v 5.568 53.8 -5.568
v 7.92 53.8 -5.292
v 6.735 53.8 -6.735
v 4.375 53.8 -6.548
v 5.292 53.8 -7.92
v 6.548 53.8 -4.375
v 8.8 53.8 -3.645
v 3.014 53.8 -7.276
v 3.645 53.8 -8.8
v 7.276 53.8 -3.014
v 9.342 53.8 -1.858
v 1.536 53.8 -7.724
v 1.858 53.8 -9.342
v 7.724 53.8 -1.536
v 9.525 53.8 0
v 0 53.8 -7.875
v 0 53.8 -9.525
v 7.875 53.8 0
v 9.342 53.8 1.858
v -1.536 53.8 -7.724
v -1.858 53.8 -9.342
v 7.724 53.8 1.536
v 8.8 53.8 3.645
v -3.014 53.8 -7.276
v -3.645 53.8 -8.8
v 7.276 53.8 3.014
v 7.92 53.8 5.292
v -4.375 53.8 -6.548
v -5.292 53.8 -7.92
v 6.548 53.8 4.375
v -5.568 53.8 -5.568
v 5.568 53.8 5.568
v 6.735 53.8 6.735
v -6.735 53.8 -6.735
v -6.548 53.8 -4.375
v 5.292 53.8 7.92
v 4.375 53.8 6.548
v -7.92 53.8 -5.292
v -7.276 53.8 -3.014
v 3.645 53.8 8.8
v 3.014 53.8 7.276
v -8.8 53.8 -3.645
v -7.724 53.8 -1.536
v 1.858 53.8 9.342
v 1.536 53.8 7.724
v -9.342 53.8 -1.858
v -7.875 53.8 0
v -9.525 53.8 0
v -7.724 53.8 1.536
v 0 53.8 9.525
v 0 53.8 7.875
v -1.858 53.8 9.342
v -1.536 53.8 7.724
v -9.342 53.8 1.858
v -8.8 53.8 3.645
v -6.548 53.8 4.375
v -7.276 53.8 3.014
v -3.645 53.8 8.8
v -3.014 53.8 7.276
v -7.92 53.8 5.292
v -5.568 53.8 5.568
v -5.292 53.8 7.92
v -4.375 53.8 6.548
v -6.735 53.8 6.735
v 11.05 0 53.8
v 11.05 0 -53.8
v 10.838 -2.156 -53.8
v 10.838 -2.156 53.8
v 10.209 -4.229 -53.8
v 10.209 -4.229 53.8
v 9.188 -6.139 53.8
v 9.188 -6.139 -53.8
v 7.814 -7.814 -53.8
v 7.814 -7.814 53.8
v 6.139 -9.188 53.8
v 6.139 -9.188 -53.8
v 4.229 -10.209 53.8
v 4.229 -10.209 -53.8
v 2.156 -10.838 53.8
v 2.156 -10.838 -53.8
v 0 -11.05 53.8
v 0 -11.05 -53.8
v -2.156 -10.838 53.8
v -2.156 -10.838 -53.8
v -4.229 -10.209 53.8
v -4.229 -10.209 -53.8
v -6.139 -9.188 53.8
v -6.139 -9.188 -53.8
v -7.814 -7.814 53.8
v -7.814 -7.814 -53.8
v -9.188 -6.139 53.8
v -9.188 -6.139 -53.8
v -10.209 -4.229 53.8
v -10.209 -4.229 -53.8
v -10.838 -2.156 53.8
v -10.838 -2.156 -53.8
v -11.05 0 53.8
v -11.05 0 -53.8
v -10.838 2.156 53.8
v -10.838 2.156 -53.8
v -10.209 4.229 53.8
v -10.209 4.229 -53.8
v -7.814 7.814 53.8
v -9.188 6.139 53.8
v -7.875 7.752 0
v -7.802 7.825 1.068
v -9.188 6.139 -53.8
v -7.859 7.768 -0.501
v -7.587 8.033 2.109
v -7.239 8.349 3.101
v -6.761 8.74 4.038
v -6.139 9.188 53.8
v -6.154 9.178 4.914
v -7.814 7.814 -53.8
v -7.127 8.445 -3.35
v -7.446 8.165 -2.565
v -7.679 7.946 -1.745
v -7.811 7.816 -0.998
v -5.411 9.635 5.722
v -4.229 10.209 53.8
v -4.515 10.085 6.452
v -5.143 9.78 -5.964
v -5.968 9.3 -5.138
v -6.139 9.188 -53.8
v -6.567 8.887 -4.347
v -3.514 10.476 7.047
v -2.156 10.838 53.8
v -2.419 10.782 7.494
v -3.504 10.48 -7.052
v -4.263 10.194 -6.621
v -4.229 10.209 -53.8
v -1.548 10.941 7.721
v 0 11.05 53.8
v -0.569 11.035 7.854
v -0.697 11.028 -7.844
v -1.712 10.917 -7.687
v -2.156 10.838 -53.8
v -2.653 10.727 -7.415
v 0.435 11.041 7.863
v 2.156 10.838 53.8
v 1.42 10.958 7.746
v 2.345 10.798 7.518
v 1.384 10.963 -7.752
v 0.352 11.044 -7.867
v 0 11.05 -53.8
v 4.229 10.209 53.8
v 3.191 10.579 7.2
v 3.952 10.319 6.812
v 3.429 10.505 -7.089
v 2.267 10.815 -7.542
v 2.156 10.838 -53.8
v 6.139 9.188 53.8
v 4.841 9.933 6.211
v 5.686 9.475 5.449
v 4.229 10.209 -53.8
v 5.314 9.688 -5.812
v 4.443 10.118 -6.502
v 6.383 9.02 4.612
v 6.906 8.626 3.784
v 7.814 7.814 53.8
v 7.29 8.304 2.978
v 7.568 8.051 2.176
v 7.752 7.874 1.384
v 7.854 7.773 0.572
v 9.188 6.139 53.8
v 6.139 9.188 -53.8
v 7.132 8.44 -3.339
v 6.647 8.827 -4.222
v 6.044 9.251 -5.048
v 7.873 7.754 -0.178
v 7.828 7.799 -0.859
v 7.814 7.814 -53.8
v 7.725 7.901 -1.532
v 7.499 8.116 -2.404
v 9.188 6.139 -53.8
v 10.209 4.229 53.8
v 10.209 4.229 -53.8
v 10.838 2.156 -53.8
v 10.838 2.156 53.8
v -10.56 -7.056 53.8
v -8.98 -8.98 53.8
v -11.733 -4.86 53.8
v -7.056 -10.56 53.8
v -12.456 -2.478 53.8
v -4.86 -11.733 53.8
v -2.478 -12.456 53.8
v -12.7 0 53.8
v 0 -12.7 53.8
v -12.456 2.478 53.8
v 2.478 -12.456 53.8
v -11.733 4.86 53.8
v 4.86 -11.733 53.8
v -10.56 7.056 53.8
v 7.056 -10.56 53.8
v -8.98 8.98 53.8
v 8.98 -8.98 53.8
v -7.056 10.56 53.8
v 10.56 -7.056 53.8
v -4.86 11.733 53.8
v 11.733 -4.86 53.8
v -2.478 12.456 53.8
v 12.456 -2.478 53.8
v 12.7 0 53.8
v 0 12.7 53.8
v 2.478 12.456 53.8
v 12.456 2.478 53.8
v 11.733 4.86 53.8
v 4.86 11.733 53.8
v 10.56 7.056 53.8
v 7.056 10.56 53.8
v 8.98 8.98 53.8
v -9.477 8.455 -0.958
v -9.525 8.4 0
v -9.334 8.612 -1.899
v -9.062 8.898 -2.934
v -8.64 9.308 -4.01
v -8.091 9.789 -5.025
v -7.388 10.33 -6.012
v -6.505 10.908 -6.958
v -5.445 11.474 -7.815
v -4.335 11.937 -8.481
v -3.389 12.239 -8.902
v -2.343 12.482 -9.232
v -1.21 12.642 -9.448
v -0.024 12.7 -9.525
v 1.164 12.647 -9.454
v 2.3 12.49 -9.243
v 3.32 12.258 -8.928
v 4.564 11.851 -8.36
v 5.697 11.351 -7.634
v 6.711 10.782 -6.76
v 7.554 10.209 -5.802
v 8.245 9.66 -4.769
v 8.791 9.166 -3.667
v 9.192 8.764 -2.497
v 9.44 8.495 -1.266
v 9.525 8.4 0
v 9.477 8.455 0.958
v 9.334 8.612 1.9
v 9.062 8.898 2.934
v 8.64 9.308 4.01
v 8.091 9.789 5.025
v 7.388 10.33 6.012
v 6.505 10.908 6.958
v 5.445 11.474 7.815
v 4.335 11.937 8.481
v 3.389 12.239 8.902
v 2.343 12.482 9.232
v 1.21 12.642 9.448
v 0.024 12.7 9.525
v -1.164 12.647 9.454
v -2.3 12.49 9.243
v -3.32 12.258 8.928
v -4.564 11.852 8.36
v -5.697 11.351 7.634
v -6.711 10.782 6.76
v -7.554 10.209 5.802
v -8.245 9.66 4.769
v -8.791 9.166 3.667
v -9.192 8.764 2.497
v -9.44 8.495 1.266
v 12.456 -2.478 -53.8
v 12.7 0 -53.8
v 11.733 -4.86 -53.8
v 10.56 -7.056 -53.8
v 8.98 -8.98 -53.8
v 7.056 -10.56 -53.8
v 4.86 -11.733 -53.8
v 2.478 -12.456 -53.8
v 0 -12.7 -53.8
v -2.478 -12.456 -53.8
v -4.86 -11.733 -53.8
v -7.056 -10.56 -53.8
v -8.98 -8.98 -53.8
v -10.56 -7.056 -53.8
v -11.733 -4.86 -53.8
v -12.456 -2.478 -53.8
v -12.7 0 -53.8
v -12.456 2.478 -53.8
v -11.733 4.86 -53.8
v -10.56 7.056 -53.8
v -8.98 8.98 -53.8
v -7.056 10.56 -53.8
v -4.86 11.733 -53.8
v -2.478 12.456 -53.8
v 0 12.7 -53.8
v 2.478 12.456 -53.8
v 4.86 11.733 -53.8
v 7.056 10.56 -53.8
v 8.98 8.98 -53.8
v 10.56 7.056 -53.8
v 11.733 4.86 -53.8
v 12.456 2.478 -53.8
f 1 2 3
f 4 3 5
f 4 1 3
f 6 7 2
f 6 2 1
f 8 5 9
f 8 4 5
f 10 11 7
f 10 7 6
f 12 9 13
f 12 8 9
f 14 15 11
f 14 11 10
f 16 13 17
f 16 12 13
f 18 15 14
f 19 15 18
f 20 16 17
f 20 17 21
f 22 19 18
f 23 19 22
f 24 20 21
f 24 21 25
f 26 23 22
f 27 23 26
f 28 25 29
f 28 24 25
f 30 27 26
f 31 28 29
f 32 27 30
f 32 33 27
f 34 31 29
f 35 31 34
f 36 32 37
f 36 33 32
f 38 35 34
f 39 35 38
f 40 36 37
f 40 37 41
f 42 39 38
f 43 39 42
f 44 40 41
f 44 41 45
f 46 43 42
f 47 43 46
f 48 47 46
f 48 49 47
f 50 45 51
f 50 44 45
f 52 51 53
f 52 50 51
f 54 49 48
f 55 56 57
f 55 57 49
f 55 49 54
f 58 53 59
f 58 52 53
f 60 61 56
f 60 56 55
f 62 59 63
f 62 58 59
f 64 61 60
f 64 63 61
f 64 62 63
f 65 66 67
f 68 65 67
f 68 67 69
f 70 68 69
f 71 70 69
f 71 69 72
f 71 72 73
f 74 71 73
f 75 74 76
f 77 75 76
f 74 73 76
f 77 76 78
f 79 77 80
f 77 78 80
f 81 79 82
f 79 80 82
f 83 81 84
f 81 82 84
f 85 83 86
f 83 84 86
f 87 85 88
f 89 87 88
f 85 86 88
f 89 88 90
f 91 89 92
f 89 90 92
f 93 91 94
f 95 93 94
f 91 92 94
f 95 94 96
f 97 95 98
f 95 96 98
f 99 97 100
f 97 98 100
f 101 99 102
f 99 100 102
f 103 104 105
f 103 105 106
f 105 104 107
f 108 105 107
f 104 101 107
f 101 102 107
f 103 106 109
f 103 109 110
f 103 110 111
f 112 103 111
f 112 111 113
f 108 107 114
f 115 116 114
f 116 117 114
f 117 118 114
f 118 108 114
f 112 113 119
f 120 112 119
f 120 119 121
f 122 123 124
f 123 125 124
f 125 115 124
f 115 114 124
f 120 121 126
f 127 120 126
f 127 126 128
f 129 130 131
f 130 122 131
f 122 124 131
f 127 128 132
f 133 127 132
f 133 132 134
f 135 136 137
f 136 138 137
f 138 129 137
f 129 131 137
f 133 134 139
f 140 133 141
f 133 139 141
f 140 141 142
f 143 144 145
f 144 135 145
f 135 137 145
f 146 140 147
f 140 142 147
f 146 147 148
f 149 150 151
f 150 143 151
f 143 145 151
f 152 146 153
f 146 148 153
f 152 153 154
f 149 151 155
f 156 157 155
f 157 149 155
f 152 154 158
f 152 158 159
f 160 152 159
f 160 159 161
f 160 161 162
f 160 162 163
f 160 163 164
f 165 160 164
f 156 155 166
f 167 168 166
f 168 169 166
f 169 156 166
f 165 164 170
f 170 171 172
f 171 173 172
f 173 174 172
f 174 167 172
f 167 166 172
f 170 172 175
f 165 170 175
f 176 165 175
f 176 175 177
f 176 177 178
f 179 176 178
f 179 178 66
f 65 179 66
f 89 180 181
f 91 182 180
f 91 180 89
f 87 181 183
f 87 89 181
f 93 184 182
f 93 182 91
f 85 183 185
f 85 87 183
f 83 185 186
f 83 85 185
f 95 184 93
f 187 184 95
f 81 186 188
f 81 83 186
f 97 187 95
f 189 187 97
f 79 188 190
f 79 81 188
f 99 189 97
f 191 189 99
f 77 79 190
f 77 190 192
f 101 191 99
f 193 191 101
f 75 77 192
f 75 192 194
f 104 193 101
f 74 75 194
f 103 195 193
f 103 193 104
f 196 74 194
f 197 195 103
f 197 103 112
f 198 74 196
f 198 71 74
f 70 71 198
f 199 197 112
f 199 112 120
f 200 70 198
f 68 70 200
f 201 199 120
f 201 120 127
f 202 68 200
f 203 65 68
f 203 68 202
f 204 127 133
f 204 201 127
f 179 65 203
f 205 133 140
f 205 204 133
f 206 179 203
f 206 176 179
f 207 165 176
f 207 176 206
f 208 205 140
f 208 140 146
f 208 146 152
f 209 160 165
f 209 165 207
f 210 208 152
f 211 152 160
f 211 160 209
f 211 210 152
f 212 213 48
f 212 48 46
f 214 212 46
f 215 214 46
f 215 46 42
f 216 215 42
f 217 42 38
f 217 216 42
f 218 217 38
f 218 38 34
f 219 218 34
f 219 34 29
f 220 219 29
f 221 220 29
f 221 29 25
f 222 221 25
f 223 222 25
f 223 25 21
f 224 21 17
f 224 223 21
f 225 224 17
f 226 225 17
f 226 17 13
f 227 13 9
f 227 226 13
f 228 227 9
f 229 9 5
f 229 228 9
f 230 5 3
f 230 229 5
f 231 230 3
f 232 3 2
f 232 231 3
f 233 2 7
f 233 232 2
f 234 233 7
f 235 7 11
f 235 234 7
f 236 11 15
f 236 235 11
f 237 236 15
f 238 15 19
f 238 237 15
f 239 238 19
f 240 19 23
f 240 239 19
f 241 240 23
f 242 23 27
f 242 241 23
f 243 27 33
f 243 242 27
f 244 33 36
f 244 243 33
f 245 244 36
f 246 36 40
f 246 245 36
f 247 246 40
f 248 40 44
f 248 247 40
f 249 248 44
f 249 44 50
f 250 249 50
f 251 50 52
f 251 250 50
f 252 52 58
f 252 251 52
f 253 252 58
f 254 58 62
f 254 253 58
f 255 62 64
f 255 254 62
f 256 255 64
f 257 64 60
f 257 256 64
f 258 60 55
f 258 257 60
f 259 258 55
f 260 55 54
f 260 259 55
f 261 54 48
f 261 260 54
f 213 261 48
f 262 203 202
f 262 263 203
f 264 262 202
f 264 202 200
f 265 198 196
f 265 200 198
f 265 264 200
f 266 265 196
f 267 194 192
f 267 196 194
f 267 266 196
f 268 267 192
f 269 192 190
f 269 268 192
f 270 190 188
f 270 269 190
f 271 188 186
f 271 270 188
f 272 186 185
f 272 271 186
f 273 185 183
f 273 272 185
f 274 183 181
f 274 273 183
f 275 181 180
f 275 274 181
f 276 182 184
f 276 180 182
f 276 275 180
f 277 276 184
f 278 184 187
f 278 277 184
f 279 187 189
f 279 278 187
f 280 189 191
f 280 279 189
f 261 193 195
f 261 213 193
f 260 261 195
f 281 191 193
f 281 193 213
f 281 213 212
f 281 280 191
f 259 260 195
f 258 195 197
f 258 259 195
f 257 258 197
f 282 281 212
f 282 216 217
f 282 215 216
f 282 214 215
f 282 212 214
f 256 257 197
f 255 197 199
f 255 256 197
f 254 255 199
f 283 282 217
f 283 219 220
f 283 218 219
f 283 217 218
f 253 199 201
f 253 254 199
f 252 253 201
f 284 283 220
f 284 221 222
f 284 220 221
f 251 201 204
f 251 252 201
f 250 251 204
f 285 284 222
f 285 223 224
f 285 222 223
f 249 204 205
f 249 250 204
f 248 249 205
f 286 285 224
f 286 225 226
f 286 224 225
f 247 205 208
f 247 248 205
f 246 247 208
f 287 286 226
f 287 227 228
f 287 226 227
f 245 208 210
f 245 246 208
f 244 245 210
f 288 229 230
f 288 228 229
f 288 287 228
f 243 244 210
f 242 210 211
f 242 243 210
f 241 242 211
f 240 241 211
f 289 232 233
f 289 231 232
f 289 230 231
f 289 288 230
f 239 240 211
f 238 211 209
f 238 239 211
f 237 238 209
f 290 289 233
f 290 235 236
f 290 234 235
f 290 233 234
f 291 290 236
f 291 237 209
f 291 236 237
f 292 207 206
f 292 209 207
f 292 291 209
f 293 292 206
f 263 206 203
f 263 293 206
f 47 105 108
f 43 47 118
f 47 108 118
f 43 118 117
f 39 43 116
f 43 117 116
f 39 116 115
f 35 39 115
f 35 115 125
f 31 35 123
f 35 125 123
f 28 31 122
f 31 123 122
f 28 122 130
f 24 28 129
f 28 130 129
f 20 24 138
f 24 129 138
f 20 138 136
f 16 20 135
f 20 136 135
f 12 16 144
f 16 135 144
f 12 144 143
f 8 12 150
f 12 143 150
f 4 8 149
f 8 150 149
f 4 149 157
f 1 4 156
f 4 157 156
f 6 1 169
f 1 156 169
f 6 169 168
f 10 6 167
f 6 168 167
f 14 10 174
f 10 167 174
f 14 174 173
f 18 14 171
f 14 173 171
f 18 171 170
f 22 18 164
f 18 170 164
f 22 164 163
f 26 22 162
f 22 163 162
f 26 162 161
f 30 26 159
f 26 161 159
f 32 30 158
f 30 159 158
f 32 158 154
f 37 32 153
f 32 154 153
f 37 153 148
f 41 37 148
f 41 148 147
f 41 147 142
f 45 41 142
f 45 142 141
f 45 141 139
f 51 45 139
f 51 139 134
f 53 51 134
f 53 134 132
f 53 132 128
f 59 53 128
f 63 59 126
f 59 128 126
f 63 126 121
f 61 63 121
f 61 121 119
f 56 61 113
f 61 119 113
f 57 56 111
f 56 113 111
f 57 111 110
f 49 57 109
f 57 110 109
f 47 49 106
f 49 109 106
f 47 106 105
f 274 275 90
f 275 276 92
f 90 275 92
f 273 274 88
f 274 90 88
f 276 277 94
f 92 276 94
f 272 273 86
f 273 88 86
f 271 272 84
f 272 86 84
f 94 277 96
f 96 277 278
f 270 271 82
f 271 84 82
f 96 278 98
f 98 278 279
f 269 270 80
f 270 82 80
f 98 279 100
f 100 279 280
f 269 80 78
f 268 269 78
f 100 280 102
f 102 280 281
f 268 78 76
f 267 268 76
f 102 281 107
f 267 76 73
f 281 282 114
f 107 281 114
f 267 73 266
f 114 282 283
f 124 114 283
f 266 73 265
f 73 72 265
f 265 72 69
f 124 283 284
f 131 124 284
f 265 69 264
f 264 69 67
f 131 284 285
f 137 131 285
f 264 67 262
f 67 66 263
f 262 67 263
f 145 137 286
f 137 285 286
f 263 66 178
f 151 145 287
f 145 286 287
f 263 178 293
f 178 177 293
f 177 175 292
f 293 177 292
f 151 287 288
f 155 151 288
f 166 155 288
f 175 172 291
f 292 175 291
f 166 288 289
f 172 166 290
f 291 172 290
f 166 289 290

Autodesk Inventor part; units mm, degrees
ref_plane "YZ Plane" through (0, 0, 0) normal (1, 0, 0) x (0, 1, 0)
ref_plane "XZ Plane" through (0, 0, 0) normal (0, 1, 0) x (-1, 0, 0)
ref_plane "XY Plane" through (0, 0, 0) normal (0, 0, 1) x (1, 0, 0)
sketch "Sketch1" plane through (0, 0, 0) normal (0, 0, 1) x (1, 0, 0)
  circle A0 centre (0, 0) radius 12.7
  dimension "d0" = 25.4
extrude "Extrusion1" add sketch "Sketch1" along normal mid plane 107.6
sketch "Sketch2" plane through (0, 0, 0) normal (0, 1, 0) x (-1, 0, 0)
  circle A0 centre (0, 0) radius 9.525
  dimension "d3" = 19.05
extrude "Extrusion2" add sketch "Sketch2" along normal blind 53.8
shell "Shell1" thickness 1.65 removed faces 3 at (2.8113, 53.8, 0.0442) at (-3.6254, -0.9542, 53.8) at (-3.6254, -0.9542, -53.8)
properties part number "ASME BPE - RED TEE-25.4-19.05" material "Stainless Steel, 316L"
